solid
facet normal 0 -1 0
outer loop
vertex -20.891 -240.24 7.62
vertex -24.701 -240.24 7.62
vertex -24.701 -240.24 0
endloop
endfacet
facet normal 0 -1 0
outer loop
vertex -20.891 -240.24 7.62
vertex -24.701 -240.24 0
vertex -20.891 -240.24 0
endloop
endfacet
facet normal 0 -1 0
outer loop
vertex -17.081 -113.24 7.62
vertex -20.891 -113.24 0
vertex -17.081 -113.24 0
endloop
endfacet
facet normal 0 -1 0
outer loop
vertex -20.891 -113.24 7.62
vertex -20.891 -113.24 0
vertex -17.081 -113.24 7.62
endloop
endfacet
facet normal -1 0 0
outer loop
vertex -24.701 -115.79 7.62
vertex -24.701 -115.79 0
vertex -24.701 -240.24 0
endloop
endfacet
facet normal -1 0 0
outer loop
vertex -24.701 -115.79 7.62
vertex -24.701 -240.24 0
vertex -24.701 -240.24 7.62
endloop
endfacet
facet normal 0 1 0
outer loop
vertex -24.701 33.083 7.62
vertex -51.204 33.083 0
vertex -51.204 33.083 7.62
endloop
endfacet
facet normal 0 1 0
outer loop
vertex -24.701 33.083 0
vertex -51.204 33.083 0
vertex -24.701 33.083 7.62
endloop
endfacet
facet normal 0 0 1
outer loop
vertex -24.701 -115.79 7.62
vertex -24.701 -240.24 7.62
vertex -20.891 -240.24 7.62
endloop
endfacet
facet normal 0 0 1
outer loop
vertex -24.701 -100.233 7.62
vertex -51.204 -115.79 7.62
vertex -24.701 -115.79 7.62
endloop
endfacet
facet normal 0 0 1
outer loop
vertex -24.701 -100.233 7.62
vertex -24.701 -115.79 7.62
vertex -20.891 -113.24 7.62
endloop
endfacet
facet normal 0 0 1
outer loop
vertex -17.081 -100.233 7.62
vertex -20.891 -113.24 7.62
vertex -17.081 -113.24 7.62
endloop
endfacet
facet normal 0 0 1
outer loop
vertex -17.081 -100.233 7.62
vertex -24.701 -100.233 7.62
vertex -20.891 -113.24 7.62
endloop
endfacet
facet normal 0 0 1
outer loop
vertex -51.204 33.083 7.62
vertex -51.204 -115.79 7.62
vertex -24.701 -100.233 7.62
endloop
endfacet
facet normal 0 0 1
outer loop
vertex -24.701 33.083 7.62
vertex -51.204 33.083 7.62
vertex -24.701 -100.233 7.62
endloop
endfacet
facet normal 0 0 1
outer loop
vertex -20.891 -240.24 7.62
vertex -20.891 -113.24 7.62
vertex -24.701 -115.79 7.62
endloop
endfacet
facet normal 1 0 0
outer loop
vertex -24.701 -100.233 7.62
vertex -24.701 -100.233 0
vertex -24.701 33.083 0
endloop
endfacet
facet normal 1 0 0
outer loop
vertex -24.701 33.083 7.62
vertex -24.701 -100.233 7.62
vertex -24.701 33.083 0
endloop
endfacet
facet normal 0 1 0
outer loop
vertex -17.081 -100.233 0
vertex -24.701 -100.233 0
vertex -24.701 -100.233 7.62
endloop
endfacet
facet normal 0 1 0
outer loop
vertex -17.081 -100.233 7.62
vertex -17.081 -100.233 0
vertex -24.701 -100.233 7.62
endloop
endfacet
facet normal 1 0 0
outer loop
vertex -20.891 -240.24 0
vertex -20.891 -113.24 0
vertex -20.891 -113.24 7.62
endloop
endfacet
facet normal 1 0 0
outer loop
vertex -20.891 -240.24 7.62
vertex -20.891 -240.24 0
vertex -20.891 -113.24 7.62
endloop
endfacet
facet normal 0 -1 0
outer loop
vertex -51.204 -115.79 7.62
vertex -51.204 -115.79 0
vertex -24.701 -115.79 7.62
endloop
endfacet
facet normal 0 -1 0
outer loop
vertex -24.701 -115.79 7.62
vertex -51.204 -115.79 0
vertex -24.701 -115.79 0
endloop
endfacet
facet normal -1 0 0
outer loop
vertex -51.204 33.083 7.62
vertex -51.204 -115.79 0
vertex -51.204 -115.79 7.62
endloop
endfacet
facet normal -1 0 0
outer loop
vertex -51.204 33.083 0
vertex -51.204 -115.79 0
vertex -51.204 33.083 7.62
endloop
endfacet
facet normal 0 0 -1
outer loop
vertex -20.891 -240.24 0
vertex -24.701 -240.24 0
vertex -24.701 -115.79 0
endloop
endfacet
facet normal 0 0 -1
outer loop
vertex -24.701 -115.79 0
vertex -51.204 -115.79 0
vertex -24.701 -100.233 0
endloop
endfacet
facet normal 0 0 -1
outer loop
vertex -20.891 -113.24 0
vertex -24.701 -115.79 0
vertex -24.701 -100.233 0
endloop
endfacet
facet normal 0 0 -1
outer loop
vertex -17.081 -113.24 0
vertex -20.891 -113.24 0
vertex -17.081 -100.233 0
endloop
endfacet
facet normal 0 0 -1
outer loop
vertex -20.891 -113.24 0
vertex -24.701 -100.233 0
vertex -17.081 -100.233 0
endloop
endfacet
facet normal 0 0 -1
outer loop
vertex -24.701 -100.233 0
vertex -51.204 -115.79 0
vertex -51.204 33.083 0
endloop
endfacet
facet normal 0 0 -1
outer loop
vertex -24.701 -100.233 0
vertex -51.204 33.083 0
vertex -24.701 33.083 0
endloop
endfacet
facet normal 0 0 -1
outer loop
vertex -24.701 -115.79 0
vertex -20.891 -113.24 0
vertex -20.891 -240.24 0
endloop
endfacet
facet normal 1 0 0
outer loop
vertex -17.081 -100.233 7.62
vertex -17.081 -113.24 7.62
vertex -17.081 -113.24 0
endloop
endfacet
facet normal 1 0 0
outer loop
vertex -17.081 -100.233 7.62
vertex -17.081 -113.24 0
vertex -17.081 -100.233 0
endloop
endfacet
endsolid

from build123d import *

# Parameters (mm, degrees)
F0_W     = 26.502896
F0_H     = 148.872193
F1_DEPTH = 7.62
F2_W     = 13.007119
F2_H     = 7.62
F3_DEPTH = 7.62
F4_W     = 3.81
F4_H     = 7.62
F5_DEPTH = 127


with BuildPart() as f1:
    # F0 (on Top) → F1 (new body)
    with BuildSketch(Plane.XY):
        with Locations((-37.95266, -41.353592)):
            Rectangle(F0_W, F0_H)
    extrude(amount=F1_DEPTH)

    # F2 (on face) → F3 (join)
    with BuildSketch(Plane.YZ.offset(-24.701212)):
        with Locations((-106.736221, 3.81)):
            Rectangle(F2_W, F2_H)
    extrude(amount=F3_DEPTH)

    # F4 (on face) → F5 (join)
    with BuildSketch(Plane.XZ.offset(113.23978)):
        with Locations((-22.796212, 3.81)):
            Rectangle(F4_W, F4_H)
    extrude(amount=F5_DEPTH)


solid = f1.part
